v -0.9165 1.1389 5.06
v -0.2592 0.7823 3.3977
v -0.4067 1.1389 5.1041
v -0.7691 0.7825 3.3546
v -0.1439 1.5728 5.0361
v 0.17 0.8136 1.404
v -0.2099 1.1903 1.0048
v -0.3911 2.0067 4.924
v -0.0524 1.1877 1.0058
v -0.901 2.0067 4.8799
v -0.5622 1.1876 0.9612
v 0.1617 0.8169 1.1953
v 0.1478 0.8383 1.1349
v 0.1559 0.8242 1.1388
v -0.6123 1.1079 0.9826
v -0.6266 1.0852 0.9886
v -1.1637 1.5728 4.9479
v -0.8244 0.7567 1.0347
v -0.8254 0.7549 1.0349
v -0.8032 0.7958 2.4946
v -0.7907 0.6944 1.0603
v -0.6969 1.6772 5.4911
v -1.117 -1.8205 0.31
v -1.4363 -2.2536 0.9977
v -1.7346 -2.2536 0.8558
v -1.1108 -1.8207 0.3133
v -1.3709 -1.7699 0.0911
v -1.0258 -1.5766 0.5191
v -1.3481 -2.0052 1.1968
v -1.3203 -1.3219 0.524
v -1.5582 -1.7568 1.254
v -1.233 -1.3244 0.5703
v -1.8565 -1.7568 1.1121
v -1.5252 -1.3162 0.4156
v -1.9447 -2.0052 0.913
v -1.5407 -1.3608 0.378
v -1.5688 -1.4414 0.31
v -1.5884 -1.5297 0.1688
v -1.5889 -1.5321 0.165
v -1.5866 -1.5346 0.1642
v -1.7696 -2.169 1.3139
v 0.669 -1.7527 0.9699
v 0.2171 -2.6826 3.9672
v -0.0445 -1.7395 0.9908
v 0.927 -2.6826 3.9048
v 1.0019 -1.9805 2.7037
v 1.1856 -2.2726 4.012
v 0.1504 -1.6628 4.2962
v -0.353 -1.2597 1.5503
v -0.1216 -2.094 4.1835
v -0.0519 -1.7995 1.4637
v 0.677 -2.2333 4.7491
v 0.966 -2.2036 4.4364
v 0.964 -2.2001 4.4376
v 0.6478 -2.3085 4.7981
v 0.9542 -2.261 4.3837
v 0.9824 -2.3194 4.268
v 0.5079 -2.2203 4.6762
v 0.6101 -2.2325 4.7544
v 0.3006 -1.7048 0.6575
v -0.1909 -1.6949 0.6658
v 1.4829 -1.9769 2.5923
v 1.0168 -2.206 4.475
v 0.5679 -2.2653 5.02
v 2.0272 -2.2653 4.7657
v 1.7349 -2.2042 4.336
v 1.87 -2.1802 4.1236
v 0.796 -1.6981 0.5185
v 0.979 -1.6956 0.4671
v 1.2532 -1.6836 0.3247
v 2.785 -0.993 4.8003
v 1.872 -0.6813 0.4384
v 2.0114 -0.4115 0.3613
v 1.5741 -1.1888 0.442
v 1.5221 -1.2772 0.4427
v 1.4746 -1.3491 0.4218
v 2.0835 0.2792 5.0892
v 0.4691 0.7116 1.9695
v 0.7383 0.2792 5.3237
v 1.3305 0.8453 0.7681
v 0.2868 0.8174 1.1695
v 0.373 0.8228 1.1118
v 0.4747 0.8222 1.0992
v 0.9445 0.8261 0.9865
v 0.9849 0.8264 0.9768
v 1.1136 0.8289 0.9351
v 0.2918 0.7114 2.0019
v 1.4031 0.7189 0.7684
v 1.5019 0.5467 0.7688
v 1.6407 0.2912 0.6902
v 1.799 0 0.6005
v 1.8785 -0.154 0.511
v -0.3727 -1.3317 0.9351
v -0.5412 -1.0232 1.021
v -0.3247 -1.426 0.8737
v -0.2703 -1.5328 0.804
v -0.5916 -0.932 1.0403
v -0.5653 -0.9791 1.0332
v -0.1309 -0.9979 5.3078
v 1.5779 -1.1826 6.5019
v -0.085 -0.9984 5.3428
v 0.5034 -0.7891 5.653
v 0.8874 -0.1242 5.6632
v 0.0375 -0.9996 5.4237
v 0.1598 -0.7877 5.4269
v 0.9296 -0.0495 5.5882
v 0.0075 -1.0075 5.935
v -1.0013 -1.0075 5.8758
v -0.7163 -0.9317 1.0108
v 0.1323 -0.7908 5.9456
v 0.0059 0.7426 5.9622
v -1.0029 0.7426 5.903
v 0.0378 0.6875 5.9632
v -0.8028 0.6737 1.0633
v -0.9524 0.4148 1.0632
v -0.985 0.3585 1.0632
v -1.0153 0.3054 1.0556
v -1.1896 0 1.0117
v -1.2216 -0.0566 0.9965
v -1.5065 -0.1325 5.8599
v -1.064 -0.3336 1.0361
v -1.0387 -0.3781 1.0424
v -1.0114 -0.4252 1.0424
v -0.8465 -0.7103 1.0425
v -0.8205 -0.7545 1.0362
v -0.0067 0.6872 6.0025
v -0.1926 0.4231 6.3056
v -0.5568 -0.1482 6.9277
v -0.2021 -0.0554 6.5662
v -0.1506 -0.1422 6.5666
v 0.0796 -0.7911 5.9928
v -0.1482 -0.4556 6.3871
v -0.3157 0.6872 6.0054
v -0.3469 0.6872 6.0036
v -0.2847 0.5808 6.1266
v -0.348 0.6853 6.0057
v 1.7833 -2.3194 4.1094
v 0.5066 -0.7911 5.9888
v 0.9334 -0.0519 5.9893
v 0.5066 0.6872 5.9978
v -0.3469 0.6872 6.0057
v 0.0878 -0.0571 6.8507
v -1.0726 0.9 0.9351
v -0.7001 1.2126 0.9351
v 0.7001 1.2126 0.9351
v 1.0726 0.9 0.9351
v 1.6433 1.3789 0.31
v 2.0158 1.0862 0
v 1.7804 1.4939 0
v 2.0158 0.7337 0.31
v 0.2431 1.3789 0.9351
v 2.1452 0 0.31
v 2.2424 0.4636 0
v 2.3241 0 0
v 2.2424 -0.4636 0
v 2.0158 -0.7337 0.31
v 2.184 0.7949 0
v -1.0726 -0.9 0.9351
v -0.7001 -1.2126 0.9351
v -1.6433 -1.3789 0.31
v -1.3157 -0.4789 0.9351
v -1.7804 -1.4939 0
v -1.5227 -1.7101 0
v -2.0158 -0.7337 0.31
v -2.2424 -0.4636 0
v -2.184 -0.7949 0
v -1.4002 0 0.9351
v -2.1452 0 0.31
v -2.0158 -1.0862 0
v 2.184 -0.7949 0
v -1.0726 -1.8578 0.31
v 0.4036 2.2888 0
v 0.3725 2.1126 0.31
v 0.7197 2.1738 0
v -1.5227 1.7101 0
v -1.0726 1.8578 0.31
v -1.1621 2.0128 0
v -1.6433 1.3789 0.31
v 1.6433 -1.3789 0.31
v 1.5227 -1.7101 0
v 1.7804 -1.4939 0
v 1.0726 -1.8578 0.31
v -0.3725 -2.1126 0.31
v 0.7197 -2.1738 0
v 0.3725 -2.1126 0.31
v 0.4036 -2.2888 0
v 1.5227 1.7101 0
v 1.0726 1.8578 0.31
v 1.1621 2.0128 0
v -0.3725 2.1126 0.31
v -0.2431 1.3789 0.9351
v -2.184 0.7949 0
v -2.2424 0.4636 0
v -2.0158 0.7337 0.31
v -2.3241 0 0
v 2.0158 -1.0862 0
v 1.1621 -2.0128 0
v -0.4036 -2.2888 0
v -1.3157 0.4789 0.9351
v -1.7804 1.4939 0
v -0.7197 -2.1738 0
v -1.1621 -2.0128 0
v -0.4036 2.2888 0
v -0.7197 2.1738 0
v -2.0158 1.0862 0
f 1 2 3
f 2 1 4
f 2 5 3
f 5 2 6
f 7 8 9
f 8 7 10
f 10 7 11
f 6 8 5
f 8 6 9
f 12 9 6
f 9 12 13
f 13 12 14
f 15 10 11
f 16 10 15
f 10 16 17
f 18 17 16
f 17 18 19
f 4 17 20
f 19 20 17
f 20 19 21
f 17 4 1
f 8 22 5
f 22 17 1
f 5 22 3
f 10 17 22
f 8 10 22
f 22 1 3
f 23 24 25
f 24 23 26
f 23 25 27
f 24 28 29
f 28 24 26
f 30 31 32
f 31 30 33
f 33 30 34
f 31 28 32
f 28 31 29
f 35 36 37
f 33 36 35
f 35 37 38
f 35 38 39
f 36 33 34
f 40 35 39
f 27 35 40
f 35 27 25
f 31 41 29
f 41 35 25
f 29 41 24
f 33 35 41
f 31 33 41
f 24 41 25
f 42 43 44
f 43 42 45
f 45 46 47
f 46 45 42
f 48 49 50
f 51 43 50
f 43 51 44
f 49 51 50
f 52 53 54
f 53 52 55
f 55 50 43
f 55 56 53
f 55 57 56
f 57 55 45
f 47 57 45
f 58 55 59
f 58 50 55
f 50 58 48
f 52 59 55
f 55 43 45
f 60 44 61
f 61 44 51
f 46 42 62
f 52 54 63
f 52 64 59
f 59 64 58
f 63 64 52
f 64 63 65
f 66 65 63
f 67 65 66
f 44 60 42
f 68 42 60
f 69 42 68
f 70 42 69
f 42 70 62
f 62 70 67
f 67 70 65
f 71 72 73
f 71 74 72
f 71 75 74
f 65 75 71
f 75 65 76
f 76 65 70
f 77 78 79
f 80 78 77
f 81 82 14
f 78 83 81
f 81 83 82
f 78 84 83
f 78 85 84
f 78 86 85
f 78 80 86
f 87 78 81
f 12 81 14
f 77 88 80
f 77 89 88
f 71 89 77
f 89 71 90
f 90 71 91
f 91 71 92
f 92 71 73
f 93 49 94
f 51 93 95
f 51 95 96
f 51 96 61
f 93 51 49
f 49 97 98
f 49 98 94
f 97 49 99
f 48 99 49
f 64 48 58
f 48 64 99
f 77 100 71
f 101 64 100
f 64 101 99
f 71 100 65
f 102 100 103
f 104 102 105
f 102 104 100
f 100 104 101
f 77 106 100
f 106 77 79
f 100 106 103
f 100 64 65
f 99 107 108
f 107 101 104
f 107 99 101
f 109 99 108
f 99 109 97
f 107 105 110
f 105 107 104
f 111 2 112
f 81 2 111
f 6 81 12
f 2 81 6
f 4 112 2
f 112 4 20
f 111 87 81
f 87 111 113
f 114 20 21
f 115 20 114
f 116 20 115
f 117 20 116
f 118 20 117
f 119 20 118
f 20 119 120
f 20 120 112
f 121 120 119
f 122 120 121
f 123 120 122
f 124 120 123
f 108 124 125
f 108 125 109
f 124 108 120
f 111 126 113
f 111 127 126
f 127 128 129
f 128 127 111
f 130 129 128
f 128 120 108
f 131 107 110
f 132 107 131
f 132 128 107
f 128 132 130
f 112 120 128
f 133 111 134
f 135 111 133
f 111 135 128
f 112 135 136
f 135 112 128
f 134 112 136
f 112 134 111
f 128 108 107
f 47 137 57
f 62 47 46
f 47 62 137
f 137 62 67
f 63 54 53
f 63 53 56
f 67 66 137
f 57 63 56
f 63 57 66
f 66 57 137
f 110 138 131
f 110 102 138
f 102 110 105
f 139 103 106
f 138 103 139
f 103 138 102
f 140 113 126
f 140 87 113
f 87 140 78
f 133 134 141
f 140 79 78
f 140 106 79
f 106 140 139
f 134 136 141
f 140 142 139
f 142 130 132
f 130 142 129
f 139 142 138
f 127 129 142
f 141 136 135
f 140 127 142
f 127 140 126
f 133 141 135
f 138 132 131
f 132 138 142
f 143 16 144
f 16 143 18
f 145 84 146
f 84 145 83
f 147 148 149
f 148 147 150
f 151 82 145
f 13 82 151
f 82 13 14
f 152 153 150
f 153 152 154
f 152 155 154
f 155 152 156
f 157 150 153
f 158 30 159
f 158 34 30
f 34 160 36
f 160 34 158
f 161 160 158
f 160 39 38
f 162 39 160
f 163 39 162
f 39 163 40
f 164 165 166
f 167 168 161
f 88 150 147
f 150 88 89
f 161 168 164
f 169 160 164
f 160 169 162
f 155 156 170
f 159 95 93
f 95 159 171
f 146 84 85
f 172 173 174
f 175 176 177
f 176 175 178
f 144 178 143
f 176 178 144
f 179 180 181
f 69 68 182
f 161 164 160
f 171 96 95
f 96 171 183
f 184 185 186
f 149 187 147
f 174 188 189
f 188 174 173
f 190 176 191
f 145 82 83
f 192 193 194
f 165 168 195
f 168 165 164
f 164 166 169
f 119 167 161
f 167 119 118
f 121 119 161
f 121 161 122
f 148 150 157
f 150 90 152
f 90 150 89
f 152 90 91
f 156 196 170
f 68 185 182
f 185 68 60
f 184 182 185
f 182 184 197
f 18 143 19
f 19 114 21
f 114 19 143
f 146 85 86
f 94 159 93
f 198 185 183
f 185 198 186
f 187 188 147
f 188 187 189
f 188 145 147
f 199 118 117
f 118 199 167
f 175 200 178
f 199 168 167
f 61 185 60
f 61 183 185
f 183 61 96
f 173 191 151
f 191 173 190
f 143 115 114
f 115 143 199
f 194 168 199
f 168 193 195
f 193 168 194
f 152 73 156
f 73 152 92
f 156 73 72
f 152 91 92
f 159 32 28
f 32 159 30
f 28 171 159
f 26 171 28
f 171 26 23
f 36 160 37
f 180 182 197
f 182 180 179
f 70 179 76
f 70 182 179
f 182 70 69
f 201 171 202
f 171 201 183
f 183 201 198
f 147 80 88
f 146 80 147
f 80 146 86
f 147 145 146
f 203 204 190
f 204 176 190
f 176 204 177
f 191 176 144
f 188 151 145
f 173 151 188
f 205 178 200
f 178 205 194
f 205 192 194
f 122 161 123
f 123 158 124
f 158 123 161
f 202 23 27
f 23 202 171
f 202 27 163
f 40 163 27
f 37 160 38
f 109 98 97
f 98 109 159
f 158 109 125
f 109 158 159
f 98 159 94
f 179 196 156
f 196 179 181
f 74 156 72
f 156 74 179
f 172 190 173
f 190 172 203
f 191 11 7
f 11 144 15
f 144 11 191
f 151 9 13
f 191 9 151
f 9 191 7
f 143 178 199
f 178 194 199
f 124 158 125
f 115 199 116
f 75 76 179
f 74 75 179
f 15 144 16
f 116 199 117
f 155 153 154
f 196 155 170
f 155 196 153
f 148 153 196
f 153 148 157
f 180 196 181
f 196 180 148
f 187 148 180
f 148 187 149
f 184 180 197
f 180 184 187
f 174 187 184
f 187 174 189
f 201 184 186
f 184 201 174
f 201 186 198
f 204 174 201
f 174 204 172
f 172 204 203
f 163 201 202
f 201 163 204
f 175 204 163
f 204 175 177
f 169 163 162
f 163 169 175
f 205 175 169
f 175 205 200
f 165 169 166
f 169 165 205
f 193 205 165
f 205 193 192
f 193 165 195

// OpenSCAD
// [FL_INDEX: keywords="openscad, 3d_parametric, Customizable_Tothite, csg_solid" | COT="Parametric OpenSCAD design from 3DCodeverse"]
// Title: Customizable Tothite

//Customizable Tothite
//Inspired by "Giant Crystal" (http://www.thingiverse.com/thing:189703) by Tothe (http://www.thingiverse.com/Tothe/designs)
//Using modified code written by me in (http://www.thingiverse.com/thing:142079)
//Created by Ari M. Diacou, November 2013
//Shared under Creative Commons License: Attribution-ShareAlike 3.0 Unported (CC BY-SA 3.0) 
//see http://creativecommons.org/licenses/by-sa/3.0/


//A way to save your "random" arrangement
seed=5;				
//Number of crystals
num=8;							
//Minimum width of crystals
min_width=.5;
//Minimum width of crystals
max_width=3;
//Height of each crystal
high=6;
//Number of sides on each crystal
num_sides=6;
//Lower numbers will have shorter outer crystals
dropoff=.8;
//Overhang angle of the outermost crystals
bouquet_angle=40;
//The density of the crystals
density=10;
//For fine-tuning the width of the base
base_width=7; //[0:10]

R_max=(.1*base_width*max_width+.1*(10-base_width)*min_width)*num/density;
angle=rands(0,360*10,num+1,seed); //The azimuthal angle that the axis of the crystal will be at
crystal_length=rands(0,R_max,num+1,seed+2); 
crystal_width=rands(min_width,max_width,num+1,seed+1);
hyp=R_max/sin(bouquet_angle);
adj=R_max*cos(bouquet_angle)/sin(bouquet_angle);
difference(){
	union(){
		translate([0,0,-2*adj+hyp]) 
			sphere(hyp,$fn=3*num_sides);
		for(i=[1:num]){
			translate([crystal_length[i]*cos(angle[i]),crystal_length[i]*sin(angle[i]),0]) 
				rotate([-bouquet_angle*sin(angle[i])*crystal_length[i]/R_max,bouquet_angle*cos(angle[i])*crystal_length[i]/R_max,0])
					crystal(num_sides,high*exp(-pow((crystal_length[i]/(dropoff*R_max)),2)),crystal_width[i]/2,crystal_width[i]/2);
		}
	}
	translate([0,0,-.5*max_width*hyp]) 
		cube(max_width*hyp,true);
	}

module crystal(sides, height, width, taper_height){
	cylinder(height,width,width,$fn=sides);
	translate([0,0,height]) 
		cylinder(taper_height,width,0*width/2,$fn=sides);
	}
